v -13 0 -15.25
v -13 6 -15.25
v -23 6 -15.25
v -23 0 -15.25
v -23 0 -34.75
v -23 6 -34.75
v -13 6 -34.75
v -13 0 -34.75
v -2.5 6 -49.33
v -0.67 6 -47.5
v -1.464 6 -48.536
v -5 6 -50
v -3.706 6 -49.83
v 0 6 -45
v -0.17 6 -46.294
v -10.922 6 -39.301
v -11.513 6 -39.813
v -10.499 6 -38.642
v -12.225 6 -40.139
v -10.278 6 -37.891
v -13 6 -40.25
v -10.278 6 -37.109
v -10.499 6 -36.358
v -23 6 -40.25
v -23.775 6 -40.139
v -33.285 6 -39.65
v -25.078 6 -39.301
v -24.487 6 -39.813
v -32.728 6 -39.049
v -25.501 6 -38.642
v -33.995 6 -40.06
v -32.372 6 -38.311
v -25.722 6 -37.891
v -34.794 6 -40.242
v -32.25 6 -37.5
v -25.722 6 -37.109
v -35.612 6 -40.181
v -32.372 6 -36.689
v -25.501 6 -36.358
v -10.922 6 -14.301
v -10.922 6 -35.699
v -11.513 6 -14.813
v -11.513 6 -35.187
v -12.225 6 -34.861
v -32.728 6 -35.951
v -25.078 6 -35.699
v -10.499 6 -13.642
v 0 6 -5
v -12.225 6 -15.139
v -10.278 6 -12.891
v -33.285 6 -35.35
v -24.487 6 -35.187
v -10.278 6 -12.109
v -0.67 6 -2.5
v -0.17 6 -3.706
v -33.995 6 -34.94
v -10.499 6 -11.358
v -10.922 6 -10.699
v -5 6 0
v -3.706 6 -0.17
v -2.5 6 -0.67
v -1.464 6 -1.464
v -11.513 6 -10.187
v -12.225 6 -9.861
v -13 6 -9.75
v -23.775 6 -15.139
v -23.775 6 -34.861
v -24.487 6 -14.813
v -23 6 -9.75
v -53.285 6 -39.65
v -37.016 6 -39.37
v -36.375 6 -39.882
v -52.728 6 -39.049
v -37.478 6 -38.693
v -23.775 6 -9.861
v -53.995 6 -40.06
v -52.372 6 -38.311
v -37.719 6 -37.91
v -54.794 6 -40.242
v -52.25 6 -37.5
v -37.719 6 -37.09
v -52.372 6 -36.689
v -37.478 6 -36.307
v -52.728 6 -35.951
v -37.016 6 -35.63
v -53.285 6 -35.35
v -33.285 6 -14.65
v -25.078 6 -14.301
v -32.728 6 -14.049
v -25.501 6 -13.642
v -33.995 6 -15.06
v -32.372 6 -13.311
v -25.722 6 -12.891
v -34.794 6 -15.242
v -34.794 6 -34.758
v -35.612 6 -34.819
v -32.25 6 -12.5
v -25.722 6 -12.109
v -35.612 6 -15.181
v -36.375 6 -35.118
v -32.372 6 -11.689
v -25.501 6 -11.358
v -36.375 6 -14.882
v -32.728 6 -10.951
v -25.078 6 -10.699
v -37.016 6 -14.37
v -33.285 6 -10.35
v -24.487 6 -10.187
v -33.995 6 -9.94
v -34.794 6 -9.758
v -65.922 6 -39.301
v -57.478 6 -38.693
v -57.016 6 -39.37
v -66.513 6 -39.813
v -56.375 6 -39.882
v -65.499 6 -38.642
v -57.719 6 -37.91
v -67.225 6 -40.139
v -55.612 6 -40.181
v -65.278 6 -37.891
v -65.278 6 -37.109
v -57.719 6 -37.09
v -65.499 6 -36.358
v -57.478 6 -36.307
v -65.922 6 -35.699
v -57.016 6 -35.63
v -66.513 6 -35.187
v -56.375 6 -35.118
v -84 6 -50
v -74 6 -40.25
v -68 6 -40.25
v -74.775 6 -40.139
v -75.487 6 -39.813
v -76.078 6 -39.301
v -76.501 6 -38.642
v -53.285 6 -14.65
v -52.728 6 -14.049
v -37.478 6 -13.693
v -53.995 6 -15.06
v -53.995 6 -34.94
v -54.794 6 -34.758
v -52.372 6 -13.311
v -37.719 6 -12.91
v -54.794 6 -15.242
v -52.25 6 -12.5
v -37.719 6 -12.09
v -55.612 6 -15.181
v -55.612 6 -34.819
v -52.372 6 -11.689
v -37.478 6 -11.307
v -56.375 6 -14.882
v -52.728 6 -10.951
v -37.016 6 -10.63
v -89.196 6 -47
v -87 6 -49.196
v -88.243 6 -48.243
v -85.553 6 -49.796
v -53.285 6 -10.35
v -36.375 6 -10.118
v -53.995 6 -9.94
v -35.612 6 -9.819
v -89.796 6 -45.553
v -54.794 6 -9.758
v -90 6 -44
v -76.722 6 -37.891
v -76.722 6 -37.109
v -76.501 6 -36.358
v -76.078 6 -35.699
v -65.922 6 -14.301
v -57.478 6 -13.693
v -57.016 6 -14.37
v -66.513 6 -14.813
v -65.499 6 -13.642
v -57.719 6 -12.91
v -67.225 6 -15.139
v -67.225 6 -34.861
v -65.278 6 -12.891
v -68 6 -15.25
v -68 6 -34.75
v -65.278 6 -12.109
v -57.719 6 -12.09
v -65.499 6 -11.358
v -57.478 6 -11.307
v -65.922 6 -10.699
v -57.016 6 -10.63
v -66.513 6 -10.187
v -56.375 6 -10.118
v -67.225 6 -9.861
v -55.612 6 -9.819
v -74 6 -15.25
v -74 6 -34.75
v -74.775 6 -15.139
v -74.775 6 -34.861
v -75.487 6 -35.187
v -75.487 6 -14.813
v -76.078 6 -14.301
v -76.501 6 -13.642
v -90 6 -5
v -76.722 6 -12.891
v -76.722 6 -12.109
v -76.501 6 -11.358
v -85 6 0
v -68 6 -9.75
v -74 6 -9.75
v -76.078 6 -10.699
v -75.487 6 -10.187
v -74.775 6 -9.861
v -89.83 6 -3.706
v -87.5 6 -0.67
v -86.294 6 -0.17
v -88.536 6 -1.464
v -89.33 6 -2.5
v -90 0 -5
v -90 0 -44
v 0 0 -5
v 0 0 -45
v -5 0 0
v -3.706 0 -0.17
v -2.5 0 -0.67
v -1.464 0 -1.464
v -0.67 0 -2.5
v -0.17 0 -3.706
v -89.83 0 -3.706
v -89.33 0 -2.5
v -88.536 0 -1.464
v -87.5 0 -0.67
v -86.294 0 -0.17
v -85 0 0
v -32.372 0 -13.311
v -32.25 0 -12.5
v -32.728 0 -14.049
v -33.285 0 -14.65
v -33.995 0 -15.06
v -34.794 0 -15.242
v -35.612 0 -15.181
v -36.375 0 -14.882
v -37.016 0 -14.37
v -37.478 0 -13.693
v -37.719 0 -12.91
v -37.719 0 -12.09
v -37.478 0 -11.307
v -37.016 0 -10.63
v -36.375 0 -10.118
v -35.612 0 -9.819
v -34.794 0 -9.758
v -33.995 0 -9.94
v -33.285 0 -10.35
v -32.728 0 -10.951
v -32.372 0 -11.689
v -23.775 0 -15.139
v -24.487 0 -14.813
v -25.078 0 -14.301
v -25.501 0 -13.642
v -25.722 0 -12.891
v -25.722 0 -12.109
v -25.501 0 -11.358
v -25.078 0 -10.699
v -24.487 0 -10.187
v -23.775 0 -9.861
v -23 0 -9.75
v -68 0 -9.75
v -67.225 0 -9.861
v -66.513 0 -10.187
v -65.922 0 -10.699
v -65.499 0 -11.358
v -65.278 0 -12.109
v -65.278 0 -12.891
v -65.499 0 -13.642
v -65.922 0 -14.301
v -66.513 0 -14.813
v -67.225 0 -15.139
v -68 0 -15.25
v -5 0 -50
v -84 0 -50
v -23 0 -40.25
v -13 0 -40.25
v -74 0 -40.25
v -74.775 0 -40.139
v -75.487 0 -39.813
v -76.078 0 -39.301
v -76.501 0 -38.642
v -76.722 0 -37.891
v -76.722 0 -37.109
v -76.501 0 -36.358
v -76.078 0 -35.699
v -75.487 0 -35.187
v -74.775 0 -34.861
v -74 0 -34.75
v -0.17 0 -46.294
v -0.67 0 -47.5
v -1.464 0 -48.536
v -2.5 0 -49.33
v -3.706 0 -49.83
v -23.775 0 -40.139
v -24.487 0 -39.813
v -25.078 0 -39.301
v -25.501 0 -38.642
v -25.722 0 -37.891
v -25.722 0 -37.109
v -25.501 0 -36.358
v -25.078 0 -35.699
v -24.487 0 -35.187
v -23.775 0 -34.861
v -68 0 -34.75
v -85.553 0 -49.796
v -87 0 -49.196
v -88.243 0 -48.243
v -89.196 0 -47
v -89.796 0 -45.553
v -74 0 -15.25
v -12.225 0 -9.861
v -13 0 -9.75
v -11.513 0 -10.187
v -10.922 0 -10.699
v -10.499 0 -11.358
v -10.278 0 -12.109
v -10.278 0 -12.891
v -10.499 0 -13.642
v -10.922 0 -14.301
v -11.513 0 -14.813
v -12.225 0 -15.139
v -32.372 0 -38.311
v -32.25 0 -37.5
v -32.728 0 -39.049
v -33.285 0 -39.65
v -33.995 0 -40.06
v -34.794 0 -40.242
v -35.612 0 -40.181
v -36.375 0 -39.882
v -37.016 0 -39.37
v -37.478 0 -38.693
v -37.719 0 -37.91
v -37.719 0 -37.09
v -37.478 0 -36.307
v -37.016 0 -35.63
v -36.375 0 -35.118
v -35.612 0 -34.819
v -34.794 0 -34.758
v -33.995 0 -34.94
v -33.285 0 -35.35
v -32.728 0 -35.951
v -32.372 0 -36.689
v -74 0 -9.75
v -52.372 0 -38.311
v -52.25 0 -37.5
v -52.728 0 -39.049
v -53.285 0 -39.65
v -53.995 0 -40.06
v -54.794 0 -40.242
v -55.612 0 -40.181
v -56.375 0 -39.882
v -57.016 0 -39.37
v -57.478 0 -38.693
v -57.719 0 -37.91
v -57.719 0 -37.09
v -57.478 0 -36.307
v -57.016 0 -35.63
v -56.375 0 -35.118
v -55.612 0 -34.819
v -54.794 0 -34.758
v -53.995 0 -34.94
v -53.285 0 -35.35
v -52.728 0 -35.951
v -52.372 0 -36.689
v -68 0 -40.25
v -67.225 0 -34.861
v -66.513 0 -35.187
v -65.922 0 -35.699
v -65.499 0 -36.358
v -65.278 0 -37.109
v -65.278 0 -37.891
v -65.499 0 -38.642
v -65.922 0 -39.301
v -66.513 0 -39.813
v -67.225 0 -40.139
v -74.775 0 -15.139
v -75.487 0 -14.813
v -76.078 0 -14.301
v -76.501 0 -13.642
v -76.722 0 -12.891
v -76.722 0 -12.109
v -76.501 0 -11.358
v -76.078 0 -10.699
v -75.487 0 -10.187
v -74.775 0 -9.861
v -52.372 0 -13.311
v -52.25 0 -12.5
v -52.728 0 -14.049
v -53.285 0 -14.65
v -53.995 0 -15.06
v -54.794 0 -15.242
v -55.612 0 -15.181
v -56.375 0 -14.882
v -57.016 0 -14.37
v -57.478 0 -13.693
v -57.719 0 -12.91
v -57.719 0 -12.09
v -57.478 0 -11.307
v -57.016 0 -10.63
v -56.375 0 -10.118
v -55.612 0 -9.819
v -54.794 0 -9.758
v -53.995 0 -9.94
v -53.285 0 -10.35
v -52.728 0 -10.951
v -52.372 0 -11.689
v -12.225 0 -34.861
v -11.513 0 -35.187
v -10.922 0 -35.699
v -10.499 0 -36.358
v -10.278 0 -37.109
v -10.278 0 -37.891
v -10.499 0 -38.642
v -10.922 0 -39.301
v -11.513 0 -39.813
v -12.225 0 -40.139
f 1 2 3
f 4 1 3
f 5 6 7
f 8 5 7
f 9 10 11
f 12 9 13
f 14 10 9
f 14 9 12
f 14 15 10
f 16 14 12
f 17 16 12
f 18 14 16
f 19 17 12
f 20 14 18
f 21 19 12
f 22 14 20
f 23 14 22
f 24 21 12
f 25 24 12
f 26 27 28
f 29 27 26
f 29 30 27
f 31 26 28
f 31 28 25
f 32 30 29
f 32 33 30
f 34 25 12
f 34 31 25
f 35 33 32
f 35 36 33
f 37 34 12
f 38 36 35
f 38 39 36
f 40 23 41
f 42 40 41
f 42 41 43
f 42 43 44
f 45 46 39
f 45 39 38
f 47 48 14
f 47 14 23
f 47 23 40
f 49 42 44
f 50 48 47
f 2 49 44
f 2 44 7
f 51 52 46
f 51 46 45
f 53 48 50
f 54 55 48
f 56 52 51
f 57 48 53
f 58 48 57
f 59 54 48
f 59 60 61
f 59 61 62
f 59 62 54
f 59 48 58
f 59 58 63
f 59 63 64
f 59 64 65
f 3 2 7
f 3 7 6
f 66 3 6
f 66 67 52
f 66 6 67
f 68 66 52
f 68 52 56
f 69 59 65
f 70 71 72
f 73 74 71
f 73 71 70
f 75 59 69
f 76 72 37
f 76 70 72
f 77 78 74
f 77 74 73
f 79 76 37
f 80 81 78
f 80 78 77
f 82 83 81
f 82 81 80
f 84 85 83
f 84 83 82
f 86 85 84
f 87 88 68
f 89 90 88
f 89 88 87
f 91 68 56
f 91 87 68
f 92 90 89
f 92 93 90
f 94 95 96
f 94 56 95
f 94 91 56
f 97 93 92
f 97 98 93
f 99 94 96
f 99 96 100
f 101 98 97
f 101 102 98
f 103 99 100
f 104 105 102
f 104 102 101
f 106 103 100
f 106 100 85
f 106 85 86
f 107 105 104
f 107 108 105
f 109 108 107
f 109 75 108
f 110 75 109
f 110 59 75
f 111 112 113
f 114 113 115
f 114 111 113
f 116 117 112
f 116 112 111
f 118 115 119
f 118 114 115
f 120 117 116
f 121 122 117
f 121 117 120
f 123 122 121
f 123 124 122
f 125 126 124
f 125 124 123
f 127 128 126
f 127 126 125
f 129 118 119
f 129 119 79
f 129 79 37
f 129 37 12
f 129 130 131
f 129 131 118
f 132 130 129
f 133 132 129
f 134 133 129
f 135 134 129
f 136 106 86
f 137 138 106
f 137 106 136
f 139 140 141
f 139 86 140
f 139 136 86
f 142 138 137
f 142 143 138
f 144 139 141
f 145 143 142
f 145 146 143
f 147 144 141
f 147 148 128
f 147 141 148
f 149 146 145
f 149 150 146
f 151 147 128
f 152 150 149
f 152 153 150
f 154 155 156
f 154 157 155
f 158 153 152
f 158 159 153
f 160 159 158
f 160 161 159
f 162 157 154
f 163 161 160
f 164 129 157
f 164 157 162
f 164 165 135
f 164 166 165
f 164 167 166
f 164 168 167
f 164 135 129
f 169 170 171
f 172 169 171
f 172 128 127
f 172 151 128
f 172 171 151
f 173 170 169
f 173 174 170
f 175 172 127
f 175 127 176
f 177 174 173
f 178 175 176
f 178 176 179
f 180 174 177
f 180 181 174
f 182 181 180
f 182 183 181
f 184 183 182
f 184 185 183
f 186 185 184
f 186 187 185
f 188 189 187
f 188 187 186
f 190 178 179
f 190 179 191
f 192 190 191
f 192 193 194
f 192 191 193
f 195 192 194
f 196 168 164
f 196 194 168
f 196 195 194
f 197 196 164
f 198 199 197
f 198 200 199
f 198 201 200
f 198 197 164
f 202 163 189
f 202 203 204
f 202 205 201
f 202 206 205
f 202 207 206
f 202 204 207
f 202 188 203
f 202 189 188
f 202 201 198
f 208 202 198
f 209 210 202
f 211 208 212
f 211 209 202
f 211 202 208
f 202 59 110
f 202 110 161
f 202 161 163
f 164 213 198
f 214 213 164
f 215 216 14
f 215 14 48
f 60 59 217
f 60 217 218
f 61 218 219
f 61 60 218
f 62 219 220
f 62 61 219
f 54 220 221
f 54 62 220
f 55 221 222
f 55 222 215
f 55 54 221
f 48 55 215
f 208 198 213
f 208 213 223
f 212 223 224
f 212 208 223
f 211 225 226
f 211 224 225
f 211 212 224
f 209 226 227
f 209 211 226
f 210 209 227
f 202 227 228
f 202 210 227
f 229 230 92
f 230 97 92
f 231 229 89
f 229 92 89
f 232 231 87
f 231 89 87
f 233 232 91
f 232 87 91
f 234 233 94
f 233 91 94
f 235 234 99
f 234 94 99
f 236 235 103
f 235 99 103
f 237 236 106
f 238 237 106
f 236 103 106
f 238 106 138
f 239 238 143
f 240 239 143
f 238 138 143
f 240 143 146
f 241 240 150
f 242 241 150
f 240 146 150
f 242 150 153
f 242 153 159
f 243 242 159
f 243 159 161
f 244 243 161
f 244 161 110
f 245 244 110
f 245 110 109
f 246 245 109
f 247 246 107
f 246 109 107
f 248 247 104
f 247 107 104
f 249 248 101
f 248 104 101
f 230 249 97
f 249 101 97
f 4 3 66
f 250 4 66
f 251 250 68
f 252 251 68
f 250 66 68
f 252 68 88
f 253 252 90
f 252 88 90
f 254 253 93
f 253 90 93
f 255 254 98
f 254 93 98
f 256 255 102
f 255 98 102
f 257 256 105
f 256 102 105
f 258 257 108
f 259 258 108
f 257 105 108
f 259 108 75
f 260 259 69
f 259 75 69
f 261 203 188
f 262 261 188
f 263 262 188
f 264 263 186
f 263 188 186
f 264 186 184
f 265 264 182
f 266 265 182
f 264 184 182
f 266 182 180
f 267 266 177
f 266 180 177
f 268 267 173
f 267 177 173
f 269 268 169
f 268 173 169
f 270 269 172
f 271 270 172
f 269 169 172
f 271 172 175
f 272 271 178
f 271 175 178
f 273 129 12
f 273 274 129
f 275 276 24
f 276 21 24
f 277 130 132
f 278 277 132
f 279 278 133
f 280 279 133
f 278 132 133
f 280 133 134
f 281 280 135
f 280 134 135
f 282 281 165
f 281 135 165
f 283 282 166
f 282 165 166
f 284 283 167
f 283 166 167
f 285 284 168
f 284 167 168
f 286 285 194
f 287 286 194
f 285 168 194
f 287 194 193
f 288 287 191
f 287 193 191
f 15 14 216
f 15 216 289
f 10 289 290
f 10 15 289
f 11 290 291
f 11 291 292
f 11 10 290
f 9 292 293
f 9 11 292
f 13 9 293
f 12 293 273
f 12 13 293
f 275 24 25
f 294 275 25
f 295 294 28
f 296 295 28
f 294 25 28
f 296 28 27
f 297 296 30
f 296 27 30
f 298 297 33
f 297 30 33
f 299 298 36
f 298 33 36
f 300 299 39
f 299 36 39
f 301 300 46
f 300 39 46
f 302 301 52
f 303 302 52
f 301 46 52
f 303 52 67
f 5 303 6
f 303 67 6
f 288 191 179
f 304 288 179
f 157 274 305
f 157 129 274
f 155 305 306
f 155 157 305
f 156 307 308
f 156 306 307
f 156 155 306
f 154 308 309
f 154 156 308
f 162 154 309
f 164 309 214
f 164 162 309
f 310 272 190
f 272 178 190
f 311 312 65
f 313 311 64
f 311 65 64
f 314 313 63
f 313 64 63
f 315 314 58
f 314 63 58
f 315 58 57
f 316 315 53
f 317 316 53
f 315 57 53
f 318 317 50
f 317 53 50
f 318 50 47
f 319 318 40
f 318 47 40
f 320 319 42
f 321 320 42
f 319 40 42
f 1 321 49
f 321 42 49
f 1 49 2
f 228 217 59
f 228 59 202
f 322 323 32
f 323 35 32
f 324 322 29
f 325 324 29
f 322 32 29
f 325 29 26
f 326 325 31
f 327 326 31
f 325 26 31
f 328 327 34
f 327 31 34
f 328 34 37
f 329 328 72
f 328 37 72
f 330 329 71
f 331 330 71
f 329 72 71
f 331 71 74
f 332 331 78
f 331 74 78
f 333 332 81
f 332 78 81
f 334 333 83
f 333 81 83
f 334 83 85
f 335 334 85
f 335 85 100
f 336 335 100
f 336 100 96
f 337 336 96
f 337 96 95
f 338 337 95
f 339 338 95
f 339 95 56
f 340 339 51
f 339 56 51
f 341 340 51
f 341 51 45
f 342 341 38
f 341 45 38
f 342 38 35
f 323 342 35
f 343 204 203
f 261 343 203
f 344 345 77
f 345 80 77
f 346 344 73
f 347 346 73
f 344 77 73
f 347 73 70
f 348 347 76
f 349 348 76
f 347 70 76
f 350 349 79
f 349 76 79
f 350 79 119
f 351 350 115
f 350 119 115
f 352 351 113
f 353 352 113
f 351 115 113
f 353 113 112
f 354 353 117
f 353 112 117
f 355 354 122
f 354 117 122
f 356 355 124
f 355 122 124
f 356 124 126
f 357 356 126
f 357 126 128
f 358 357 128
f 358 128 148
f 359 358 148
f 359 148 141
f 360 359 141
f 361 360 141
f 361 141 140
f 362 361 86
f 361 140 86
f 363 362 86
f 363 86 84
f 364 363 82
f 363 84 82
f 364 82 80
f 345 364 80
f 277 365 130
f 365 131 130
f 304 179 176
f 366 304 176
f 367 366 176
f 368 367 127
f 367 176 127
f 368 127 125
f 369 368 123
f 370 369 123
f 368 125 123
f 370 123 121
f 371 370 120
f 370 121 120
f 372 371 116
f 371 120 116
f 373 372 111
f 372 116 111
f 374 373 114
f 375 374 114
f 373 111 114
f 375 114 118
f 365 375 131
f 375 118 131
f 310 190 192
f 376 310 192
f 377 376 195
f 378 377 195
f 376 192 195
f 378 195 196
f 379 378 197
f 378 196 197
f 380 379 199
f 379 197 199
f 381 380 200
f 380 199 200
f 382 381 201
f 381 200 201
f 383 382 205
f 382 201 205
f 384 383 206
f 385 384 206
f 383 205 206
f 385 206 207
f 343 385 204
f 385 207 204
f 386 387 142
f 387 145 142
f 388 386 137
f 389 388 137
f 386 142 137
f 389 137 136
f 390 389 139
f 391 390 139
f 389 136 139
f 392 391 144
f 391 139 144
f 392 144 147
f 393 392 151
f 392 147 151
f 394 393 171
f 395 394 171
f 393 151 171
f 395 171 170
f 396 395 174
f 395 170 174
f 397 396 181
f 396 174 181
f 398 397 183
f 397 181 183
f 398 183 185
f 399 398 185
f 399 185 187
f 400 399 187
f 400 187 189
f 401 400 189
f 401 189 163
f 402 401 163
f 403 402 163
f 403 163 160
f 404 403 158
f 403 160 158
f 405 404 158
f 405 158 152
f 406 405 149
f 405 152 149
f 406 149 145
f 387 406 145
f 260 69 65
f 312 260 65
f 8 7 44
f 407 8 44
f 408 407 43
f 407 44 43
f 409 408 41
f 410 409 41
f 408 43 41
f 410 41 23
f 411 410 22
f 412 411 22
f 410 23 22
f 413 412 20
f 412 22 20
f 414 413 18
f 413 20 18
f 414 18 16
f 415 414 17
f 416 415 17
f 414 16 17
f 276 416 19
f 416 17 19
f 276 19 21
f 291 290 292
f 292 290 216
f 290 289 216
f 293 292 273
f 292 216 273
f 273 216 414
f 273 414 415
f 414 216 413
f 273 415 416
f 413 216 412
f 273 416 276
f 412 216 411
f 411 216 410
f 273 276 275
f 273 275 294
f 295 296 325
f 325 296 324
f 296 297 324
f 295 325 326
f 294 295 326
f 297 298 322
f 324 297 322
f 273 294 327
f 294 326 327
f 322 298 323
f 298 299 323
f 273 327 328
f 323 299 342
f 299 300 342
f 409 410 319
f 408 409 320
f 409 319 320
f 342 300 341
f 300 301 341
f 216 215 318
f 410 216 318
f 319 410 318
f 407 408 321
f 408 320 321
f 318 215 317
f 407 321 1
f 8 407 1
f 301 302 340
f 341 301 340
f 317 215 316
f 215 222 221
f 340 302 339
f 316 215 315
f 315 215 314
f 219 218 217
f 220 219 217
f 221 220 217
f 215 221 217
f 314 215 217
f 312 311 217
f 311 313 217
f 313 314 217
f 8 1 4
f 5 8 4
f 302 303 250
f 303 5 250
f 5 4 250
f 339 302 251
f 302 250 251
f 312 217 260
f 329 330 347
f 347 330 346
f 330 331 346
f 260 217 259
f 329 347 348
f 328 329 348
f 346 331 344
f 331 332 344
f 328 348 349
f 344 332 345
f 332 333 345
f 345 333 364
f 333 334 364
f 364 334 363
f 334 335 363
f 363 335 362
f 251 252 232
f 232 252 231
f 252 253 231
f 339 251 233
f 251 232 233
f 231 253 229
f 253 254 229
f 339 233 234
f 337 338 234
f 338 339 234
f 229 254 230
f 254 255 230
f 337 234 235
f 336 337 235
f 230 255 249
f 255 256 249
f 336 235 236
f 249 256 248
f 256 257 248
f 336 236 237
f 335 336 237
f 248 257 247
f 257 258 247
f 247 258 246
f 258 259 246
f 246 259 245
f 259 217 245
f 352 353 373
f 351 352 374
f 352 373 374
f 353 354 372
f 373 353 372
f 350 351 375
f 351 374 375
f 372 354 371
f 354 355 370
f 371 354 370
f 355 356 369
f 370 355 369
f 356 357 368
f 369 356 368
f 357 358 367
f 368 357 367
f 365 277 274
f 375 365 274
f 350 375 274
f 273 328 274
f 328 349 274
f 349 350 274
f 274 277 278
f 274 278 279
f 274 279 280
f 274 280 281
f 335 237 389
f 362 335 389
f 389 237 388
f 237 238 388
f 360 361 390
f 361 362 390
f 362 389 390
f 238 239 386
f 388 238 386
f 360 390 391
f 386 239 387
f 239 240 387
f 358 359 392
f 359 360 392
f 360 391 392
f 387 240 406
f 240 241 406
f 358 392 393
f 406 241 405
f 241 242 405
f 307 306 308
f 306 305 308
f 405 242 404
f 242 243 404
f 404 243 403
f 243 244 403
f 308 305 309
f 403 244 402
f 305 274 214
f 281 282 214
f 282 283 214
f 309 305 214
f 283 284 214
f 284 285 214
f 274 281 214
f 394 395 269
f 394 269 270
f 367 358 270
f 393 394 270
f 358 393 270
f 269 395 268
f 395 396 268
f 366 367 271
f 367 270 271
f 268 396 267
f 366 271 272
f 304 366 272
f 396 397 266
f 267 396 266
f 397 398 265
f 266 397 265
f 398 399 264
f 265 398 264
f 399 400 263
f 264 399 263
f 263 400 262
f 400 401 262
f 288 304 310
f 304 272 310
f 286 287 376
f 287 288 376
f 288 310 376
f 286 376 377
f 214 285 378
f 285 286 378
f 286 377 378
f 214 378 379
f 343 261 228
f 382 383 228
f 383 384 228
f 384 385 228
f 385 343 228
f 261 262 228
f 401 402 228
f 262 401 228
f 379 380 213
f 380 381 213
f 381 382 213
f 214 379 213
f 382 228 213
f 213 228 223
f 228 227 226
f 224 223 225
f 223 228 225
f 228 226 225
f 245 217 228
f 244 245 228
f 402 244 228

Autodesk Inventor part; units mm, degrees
ref_plane "YZ Plane" through (0, 0, 0) normal (1, 0, 0) x (0, 1, 0)
ref_plane "XZ Plane" through (0, 0, 0) normal (0, 1, 0) x (-1, 0, 0)
ref_plane "XY Plane" through (0, 0, 0) normal (0, 0, 1) x (1, 0, 0)
sketch "Sketch1" plane through (0, 0, 0) normal (0, 1, 0) x (-1, 0, 0)
  line L0 (0, 0) -> (90, 0)
  line L1 (90, 0) -> (90, -50)
  line L2 (90, -50) -> (0, -50)
  line L3 (0, -50) -> (0, 0)
  line L4 (0, 0) -> (0, -16.6667)
  line L5 (0, -16.6667) -> (6, -16.6667)
  dimension "d0" = 90
  dimension "d1" = 50
  dimension "d2" = 16.6667
  dimension "d3" = 6
extrude "Extrusion1" add sketch "Sketch1" along normal blind 6
sketch "Sketch3" plane through (0, 6, 0) normal (0, 1, 0) x (1, 0, 0)
  circle A0 centre (-13, 12.5) radius 2.75
  line L0 (0, 0) -> (0, 50) projected
  line L1 (-90, 0) -> (0, 0) projected
  circle A1 centre (-13, 37.5) radius 2.75
  line L2 (-13, 12.5) -> (-18, 12.5)
  line L3 (-23, 12.5) -> (-13, 12.5) construction
  line L4 (-23, 9.75) -> (-13, 9.75)
  line L5 (-13, 15.25) -> (-23, 15.25)
  arc A2 (-23, 15.25) -> (-23, 9.75) centre (-23, 12.5) ccw
  arc A3 (-13, 9.75) -> (-13, 15.25) centre (-13, 12.5) ccw
  line L6 (-13, 37.5) -> (-18, 37.5)
  line L7 (-13, 37.5) -> (-8, 37.5) construction
  line L8 (-23, 37.5) -> (-13, 37.5) construction
  line L9 (-23, 34.75) -> (-13, 34.75)
  line L10 (-13, 40.25) -> (-23, 40.25)
  arc A4 (-23, 40.25) -> (-23, 34.75) centre (-23, 37.5) ccw
  arc A5 (-13, 34.75) -> (-13, 40.25) centre (-13, 37.5) ccw
  dimension "d21" = 5.5
  dimension "d22" = 13
  dimension "d23" = 12.5
  dimension "d26" = 25
  dimension "d87" = 5
  dimension "d88" = 5
  dimension "d89" = 180
extrude "Extrusion3" cut sketch "Sketch3" against normal through all
sketch "Sketch4" plane through (0, 6, 0) normal (0, 1, 0) x (1, 0, 0)
  arc A0 (-13, 9.75) -> (-13, 15.25) centre (-13, 12.5) ccw projected
  line L0 (-13, 12.5) -> (-68, 12.5)
  line L1 (-68, 12.5) -> (-74, 12.5) construction
  line L2 (-68, 15.25) -> (-74, 15.25)
  line L3 (-74, 9.75) -> (-68, 9.75)
  arc A1 (-68, 9.75) -> (-68, 15.25) centre (-68, 12.5) ccw
  arc A2 (-74, 15.25) -> (-74, 9.75) centre (-74, 12.5) ccw
  point P0 (0, 0)
  point P1 (-71, 12.5)
  dimension "d33" = 55
  dimension "d34" = 6
  dimension "d35" = 5.5
extrude "Extrusion4" cut sketch "Sketch4" against normal through all
pattern_linear "Rectangular Pattern2" count 2 spacing 25 along (0, 0, -1) of "Extrusion4"
fillet "Fillet2" radius 5 3 edges at (-90, 3, 0) (0, 3, 0) (0, 3, -50)
sketch "Sketch7" plane through (0, 6, 0) normal (0, 1, 0) x (1, 0, 0)
  arc A0 (-13, 9.75) -> (-13, 15.25) centre (-13, 12.5) ccw projected
  line L0 (-13, 12.5) -> (-35, 12.5)
  line L1 (-35, 12.5) -> (-55, 12.5)
  circle A1 centre (-55, 12.5) radius 2.75
  circle A2 centre (-35, 12.5) radius 2.75
  line L2 (0, 5) -> (0, 45) projected
  line L3 (0, 0) -> (0, 45)
  circle A3 centre (-35, 37.5) radius 2.75
  circle A4 centre (-55, 37.5) radius 2.75
  dimension "d55" = 22
  dimension "d56" = 20
  dimension "d57" = 5.5
  dimension "d58" = 5.5
  dimension "d61" = 25
extrude "Extrusion7" cut sketch "Sketch7" against normal through all
sketch "Sketch9" plane through (0, 6, 0) normal (0, 1, 0) x (1, 0, 0)
  point P0 (0, 0)
fillet "Fillet3" radius 6 1 edges at (-90, 3, -50)
properties part number "X_Carriage_Plate"
